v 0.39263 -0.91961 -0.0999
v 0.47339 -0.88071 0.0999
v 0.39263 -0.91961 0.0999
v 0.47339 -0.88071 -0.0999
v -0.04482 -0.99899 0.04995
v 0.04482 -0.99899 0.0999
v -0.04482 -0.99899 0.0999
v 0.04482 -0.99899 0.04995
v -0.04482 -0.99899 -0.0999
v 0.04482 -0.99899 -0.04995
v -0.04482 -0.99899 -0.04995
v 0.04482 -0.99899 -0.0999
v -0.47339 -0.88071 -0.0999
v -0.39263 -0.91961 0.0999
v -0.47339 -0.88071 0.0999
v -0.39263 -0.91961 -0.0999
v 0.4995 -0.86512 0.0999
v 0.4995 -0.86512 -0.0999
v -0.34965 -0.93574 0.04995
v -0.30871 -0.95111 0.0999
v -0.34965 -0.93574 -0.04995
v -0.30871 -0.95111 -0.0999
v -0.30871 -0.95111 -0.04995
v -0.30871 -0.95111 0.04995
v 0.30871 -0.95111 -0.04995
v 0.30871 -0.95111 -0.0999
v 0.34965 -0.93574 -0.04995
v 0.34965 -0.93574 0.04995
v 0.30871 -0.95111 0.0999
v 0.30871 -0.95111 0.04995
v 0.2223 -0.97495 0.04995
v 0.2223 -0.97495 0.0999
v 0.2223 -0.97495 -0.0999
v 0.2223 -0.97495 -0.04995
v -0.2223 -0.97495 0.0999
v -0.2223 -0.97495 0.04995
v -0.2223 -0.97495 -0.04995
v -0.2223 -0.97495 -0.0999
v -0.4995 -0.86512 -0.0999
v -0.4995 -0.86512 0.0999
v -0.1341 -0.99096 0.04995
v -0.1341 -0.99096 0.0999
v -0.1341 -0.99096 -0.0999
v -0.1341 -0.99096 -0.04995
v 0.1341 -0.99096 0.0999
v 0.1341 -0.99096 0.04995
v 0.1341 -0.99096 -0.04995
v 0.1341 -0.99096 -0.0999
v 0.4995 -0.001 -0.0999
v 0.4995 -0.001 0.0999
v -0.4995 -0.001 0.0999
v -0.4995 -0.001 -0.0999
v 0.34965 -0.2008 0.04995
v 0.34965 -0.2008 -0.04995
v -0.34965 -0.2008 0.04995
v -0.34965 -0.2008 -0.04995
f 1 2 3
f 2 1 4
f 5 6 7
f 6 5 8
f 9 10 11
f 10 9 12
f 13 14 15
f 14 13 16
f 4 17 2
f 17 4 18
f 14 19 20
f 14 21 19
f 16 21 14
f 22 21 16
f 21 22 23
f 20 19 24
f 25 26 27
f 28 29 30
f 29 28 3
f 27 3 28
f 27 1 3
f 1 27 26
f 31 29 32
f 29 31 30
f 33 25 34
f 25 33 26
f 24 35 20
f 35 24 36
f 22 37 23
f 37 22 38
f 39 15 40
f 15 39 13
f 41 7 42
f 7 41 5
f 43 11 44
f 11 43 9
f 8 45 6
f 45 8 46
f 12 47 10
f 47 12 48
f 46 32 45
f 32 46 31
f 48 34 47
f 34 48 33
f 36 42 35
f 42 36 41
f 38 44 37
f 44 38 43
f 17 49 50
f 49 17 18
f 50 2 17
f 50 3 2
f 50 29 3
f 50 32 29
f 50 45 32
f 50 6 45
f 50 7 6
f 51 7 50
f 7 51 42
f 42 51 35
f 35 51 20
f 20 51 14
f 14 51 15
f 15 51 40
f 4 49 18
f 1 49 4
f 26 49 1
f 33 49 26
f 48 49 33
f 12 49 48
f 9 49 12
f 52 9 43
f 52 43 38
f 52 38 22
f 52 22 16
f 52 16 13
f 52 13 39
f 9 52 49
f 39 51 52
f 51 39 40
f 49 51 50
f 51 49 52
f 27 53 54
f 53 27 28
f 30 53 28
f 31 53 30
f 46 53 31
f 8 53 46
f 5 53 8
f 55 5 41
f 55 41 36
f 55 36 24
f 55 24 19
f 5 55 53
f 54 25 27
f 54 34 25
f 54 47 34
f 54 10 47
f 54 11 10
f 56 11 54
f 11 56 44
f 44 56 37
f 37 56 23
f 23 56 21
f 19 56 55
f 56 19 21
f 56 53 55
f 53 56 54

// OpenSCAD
l=2;
x=2;
g=2.5;
t=0.7;
h=0.1;
s=0.1;
ok = true;

if (!ok) {
  color("gold",alpha=0.8)
  translate([0,0.001,0])
  difference() {
    translate([-t/2,-1.2,-h/2]) cube([t,1,h]);
    difference() {
        cube([g,g,0.21],center=true);
        cylinder(h=0.22,r=1,center=true,$fn=70);
    }
  }
}  
if (ok) {
  translate([0,-0.001,0]) scale([0.999,0.999,0.999])
  difference() {
    color("red",alpha=0.6)
    translate([0,-x/4,0]) cube([l/2,x/2,0.20],center=true);
    color("red",alpha=0.6)
    difference() {
        cube([g,g,0.21],center=true);
        cylinder(h=0.22,r=1,center=true,$fn=70);
    }
    translate([-t/2,-1.2,-h/2]) cube([t,1,h]);
  }
}
if (!ok) {
    color("gold",alpha=0.8) difference() 
    {
      rotate([0,0,-18]) difference() {
          cylinder(h=0.2,r=1,center=true,$fn=70);
          translate([0,0.5,0])
              cylinder(h=1,r=0.3,center=true,$fn=50);
          translate([-0.75,0,0])
              cylinder(h=1,r=0.1,center=true,$fn=30);
      }
      translate([0,-x/4,0])
        cube([l/2,x/2,0.25],center=true);
    }
}
